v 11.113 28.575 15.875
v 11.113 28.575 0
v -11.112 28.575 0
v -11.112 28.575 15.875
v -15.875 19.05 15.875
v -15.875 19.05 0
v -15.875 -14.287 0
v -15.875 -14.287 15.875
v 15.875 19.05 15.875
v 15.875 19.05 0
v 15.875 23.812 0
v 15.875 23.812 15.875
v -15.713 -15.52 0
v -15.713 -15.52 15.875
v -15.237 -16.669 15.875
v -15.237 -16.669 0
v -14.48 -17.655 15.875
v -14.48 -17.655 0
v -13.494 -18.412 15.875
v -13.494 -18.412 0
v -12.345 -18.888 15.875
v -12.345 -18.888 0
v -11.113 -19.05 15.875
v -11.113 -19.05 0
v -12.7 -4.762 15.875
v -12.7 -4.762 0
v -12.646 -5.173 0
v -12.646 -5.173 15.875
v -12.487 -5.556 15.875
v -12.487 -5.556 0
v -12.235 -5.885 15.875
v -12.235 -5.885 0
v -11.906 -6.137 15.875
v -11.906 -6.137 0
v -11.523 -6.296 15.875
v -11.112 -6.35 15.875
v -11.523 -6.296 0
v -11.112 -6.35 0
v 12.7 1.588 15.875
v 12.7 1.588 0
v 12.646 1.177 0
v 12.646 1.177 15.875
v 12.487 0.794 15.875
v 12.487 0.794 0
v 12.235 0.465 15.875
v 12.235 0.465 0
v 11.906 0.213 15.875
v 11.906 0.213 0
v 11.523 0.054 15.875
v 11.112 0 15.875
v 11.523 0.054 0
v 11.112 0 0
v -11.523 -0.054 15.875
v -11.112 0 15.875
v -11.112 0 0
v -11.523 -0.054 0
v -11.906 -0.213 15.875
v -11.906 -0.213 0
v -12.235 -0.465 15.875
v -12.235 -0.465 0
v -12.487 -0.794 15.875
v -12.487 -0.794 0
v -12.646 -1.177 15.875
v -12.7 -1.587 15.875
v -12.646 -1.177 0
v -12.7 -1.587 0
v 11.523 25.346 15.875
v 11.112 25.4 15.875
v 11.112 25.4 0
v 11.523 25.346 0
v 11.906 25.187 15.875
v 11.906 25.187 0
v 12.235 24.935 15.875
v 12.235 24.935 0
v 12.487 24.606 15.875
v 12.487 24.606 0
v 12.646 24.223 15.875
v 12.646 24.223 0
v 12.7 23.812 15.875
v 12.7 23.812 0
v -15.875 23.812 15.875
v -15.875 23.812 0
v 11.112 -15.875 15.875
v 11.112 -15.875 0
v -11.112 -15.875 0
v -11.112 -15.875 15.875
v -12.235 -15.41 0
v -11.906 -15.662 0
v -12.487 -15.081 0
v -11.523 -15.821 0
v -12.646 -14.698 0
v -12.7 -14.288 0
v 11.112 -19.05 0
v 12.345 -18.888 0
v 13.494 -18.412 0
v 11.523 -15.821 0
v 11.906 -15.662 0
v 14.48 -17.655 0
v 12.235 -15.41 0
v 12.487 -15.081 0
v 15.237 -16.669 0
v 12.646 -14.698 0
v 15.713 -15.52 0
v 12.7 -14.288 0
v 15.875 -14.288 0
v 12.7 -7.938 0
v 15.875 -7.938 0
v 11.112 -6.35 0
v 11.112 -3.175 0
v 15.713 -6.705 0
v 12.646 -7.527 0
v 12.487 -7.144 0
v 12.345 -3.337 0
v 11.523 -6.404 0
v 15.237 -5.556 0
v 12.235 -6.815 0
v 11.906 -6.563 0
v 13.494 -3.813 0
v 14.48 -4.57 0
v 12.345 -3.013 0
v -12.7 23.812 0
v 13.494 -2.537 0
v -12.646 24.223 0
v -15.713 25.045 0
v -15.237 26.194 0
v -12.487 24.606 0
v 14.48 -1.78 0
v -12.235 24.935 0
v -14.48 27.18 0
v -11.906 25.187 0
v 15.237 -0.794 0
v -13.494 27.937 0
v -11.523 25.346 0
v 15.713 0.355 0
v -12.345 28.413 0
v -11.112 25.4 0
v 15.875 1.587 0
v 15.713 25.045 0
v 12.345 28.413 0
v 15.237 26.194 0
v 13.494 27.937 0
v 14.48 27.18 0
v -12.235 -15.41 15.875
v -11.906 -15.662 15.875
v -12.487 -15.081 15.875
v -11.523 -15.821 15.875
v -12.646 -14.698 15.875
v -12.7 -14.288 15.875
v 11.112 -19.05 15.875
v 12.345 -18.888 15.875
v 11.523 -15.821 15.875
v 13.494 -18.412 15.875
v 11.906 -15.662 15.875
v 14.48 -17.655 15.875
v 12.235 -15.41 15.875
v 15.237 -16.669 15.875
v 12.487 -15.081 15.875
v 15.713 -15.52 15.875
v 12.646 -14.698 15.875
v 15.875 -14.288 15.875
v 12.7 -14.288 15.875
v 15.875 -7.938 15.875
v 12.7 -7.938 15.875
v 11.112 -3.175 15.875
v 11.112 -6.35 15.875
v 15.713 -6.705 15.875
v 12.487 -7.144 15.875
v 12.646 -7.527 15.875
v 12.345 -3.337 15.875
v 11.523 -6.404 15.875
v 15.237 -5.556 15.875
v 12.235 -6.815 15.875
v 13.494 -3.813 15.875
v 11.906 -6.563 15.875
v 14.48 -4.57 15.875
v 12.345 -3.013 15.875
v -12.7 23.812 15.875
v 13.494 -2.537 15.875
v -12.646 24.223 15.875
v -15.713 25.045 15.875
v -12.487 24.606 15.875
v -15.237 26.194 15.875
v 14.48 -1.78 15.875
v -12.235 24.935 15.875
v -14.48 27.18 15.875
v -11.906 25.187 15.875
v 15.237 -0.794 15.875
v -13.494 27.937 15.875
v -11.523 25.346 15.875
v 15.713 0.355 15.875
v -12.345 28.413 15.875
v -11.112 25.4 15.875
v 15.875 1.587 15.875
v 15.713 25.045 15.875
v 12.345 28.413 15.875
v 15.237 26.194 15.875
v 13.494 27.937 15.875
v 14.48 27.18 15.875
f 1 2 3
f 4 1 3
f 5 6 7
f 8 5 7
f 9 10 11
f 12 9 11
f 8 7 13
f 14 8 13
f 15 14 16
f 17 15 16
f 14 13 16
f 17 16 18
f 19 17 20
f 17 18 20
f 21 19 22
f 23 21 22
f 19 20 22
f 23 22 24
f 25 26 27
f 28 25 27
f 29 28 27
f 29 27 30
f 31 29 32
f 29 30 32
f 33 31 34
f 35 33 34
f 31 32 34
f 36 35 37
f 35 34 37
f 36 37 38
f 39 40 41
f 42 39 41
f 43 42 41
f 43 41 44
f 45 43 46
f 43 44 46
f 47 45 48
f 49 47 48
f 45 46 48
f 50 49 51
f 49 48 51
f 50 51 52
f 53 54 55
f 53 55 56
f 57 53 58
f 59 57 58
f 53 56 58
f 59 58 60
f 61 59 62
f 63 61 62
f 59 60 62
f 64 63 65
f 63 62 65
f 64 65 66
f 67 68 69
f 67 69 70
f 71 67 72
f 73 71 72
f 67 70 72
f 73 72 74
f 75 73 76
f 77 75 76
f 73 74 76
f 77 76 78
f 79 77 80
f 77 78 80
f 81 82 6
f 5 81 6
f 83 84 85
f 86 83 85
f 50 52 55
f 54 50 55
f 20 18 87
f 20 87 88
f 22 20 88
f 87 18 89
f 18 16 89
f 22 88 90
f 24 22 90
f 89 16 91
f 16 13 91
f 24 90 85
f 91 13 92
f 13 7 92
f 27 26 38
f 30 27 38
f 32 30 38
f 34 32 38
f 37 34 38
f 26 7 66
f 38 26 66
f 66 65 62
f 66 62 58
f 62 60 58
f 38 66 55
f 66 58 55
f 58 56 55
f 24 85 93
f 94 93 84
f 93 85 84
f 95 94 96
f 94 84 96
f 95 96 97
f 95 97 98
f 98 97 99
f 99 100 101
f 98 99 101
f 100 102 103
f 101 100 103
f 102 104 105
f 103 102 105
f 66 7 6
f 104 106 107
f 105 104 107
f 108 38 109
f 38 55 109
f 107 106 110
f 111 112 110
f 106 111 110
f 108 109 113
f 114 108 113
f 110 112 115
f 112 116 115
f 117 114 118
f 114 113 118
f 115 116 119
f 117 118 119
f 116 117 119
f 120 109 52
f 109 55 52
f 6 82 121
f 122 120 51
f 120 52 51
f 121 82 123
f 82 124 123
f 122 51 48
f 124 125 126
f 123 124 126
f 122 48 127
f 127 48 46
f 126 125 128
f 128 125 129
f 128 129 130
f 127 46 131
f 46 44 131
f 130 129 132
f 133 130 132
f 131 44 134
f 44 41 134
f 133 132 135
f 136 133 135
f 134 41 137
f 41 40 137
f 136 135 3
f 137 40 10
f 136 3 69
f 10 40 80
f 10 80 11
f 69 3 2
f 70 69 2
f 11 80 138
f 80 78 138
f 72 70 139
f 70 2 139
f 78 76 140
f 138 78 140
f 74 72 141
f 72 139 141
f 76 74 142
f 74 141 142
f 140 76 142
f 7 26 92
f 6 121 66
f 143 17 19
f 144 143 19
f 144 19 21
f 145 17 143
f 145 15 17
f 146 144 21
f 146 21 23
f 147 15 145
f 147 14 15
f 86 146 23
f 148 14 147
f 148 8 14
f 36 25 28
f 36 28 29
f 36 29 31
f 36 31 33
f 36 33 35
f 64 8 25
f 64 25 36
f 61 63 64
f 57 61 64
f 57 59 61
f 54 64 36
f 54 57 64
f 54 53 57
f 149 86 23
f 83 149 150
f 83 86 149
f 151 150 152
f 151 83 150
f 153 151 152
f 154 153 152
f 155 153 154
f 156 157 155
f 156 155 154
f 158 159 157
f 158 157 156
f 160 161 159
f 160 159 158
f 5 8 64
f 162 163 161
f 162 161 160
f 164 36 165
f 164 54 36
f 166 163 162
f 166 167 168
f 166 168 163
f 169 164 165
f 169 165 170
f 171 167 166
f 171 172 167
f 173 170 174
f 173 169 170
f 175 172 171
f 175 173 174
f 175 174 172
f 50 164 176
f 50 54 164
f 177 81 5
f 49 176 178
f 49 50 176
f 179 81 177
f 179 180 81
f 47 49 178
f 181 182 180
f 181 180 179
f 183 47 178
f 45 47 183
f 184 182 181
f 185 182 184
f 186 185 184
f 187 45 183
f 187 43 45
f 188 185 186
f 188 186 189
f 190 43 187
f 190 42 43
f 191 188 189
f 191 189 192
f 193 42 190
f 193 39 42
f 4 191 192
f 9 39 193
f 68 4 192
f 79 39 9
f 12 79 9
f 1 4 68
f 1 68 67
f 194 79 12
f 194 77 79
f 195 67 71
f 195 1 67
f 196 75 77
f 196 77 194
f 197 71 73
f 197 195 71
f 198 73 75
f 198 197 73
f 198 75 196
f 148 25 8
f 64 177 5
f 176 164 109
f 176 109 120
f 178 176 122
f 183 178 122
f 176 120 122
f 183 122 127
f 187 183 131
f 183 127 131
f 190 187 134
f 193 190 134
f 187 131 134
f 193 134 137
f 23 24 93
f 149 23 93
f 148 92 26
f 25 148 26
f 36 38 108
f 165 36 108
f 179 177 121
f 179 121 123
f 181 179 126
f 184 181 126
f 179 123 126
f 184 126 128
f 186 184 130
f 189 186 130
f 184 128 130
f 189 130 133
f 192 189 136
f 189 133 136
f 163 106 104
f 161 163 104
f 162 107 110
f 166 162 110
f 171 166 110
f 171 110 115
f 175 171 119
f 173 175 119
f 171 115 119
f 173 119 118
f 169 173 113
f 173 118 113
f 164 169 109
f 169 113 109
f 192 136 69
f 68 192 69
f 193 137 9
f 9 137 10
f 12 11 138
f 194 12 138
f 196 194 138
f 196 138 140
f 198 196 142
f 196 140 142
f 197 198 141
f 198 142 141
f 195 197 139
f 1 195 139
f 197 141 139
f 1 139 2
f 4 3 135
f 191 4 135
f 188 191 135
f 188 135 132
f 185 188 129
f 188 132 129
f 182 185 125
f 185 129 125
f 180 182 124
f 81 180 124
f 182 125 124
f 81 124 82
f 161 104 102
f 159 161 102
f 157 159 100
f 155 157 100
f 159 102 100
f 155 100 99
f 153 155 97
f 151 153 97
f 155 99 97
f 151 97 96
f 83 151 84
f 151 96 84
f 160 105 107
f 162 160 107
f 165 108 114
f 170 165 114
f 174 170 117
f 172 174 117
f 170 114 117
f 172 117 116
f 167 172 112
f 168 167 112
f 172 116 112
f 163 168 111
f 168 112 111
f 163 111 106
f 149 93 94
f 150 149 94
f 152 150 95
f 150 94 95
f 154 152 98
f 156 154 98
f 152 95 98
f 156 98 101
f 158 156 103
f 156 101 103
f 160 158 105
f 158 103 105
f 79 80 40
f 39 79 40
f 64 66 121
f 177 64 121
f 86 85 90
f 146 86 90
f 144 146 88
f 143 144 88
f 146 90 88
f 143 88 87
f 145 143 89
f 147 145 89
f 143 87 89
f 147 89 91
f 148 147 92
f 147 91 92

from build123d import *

# Parameters (mm, degrees)
F1_DEPTH = 15.875


# Not quite as in the source:
# - ends of sketch curves that miss each other by under 0.0002 mm in the source are joined
# - the program builds the solid bodies; features that only make, move or delete a surface that nothing else refers to are left out


with BuildPart() as f1:
    # F0 (on Top) → F1 (new body)
    with BuildSketch(Plane.XY):
        with BuildLine():
            Line((-11.1125005688, -19.05), (11.1124994312, -19.05))
            ThreePointArc((11.1124994312, -19.05), (14.4800954095, -17.6550961124), (15.8749994312, -14.2875001896))
            Line((15.8749994312, -14.2875001896), (15.874999684, -7.9375001896))
            ThreePointArc((15.874999684, -7.9375001896), (14.4800957964, -4.5699040216), (11.112499684, -3.175))
            ThreePointArc((11.112499684, -3.175), (14.4800960416, -1.7800961124), (15.8750000632, 1.5874998104))
            Line((15.8750000632, 1.5874998104), (15.8750007584, 19.05))
            Line((15.8750007584, 19.05), (15.8750007584, 23.8125))
            ThreePointArc((15.8750007584, 23.8125), (14.4800968038, 27.1800960454), (11.1125007584, 28.575))
            Line((11.1125007584, 28.575), (-11.1124992416, 28.575))
            ThreePointArc((-11.1124992416, 28.575), (-14.480095287, 27.1800960454), (-15.8749992416, 23.8125))
            Line((-15.8749992416, 23.8125), (-15.8749992416, 19.05))
            Line((-15.8749992416, 19.05), (-15.8750005688, -14.2874998104))
            ThreePointArc((-15.8750005688, -14.2874998104), (-14.4800966813, -17.6550959784), (-11.1125005688, -19.05))
        make_face()
        with BuildLine():
            Line((-12.7, -6.35), (-12.7, -4.7625))
            ThreePointArc((-12.7, -4.7625), (-12.2350320151, -5.8850320151), (-11.1125, -6.35))
            Line((-11.1125, -6.35), (11.1125, -6.35))
            ThreePointArc((11.1125, -6.35), (12.2350320151, -6.8149679849), (12.7, -7.9375))
            Line((12.7, -7.9375), (12.7, -14.2875))
            ThreePointArc((12.7, -14.2875), (12.2350320151, -15.4100320151), (11.1125, -15.875))
            Line((11.1125, -15.875), (-11.1125, -15.875))
            ThreePointArc((-11.1125, -15.875), (-12.2350320151, -15.4100320151), (-12.7, -14.2875))
            Line((-12.7, -14.2875), (-12.7, -6.35))
        make_face(mode=Mode.SUBTRACT)
        with BuildLine():
            ThreePointArc((-12.7, -1.5875), (-12.2350320151, -2.7100320151), (-11.1125, -3.175))
            ThreePointArc((-11.1125, -3.175), (-12.2350320151, -3.6399679849), (-12.7, -4.7625))
            Line((-12.7, -4.7625), (-12.7, -3.175))
            Line((-12.7, -3.175), (-12.7, -1.5875))
        make_face(mode=Mode.SUBTRACT)
        with BuildLine():
            ThreePointArc((-11.1125, 0), (-12.2350320151, -0.4649679849), (-12.7, -1.5875))
            Line((-12.7, -1.5875), (-12.7, 0))
            Line((-12.7, 0), (-12.7, 23.8125))
            ThreePointArc((-12.7, 23.8125), (-12.2350320151, 24.9350320151), (-11.1125, 25.4))
            Line((-11.1125, 25.4), (11.1125, 25.4))
            ThreePointArc((11.1125, 25.4), (12.2350320151, 24.9350320151), (12.7, 23.8125))
            Line((12.7, 23.8125), (12.7, 1.5875))
            ThreePointArc((12.7, 1.5875), (12.2350320151, 0.4649679849), (11.1125, 0))
            Line((11.1125, 0), (-11.1125, 0))
        make_face(mode=Mode.SUBTRACT)
        with BuildLine():
            Line((-12.7, -3.175), (-11.1125, -3.175))
            ThreePointArc((-11.1125, -3.175), (-12.2350320151, -2.7100320151), (-12.7, -1.5875))
            Line((-12.7, -1.5875), (-12.7, -3.175))
        make_face()
        with BuildLine():
            ThreePointArc((-12.7, -4.7625), (-12.2350320151, -3.6399679849), (-11.1125, -3.175))
            Line((-11.1125, -3.175), (-12.7, -3.175))
            Line((-12.7, -3.175), (-12.7, -4.7625))
        make_face()
    extrude(amount=F1_DEPTH)


solid = f1.part
